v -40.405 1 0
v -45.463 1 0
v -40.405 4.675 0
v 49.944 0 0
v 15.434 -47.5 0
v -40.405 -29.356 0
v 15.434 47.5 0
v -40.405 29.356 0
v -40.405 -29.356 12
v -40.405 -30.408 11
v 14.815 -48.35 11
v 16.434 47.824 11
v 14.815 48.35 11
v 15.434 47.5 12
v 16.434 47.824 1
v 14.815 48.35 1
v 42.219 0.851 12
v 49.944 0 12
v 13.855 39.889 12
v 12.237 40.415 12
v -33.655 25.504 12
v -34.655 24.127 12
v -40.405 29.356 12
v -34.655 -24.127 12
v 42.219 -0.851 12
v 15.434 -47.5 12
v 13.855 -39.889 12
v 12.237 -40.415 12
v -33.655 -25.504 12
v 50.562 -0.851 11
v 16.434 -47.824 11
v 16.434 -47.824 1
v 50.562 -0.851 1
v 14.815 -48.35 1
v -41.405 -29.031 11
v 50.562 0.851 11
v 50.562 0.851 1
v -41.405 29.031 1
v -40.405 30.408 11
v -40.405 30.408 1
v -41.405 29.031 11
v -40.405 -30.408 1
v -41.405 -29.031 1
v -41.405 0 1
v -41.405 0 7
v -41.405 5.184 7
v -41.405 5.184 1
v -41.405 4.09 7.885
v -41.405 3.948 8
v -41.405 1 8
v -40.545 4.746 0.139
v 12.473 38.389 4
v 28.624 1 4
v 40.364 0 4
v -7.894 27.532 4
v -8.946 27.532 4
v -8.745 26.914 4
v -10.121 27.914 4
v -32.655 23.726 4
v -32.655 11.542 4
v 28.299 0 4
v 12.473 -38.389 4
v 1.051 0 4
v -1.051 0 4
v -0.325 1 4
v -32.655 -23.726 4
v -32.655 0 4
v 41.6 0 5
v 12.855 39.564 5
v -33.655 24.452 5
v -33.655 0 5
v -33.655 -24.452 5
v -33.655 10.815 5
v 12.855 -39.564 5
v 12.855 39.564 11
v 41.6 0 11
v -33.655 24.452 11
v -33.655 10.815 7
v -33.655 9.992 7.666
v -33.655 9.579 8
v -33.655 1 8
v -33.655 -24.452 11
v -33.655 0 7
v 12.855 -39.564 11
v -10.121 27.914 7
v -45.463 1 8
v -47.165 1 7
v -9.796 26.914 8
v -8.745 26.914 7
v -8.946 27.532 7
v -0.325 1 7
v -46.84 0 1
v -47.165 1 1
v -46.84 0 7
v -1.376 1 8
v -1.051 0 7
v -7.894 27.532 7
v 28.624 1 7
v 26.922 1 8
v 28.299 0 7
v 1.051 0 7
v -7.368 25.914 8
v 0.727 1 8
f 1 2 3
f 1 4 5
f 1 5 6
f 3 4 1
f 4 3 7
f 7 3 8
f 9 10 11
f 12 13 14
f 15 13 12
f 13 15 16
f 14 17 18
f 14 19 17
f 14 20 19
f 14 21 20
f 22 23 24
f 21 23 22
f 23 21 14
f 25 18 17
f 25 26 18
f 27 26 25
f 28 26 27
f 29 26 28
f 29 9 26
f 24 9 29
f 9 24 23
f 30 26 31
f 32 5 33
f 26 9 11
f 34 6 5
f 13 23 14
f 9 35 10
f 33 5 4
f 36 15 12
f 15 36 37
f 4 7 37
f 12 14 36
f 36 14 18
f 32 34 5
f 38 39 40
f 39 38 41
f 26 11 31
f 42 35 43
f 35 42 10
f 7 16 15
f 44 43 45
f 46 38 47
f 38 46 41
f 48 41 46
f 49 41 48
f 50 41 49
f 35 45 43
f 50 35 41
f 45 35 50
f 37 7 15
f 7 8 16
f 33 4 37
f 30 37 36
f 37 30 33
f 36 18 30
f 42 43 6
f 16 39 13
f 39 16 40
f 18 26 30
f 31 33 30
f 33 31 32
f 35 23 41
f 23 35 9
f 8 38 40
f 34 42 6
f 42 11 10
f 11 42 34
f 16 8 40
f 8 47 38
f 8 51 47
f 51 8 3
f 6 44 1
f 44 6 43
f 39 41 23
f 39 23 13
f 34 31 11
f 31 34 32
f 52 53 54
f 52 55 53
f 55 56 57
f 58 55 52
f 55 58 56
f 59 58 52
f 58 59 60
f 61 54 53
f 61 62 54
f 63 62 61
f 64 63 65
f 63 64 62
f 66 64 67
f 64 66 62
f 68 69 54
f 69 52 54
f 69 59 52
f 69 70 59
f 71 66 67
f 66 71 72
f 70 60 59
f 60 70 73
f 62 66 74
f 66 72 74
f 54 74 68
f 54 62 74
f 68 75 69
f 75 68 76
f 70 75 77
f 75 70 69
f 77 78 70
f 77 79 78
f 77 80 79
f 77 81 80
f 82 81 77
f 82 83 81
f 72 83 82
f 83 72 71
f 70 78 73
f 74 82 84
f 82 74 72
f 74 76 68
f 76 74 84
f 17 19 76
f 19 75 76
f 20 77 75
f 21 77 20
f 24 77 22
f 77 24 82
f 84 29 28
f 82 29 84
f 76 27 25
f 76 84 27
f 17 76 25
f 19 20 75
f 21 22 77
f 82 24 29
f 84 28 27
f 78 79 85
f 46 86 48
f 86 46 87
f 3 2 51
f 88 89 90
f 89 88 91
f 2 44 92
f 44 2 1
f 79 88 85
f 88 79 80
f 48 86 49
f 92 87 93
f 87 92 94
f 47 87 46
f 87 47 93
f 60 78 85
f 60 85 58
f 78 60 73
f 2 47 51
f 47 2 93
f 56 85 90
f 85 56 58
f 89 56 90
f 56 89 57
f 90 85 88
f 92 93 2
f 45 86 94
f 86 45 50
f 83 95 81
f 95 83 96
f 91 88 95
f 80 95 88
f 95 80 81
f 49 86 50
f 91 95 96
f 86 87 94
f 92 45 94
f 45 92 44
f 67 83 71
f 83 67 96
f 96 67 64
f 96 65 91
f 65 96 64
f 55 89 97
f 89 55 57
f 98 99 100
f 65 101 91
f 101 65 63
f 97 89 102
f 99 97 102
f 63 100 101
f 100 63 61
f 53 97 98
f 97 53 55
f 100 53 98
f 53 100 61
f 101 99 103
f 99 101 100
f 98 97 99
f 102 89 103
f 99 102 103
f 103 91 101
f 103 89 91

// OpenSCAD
// file: ../functions/vectors2D.scad
/* * * * * * * * * * * * * * * * * * * * * * * * * * * * * * * * * * * * *\
 * Copyright (C) Claus Schrammel <claus@f05fk.net>                       *
 *                                                                       *
 * This program is free software: you can redistribute it and/or modify  *
 * it under the terms of the GNU General Public License as published by  *
 * the Free Software Foundation, either version 3 of the License, or     *
 * (at your option) any later version.                                   *
 *                                                                       *
 * This program is distributed in the hope that it will be useful,       *
 * but WITHOUT ANY WARRANTY; without even the implied warranty of        *
 * MERCHANTABILITY or FITNESS FOR A PARTICULAR PURPOSE.  See the         *
 * GNU General Public License for more details.                          *
 *                                                                       *
 * You should have received a copy of the GNU General Public License     *
 * along with this program.  If not, see <http://www.gnu.org/licenses/>. *
 *                                                                       *
 * SPDX-License-Identifier: GPL-3.0-or-later                             *
\* * * * * * * * * * * * * * * * * * * * * * * * * * * * * * * * * * * * */

include <utils.scad>

function normal_vector_2D(vector) = [-vector.y, vector.x];
function unit_vector_2D(vector) = vector / norm(vector);

/*
 * Calculates the coefficient for v1 to get from p1 to the intersection point of the two lines p1/v1 and p2/v2:
 * intersection_point = p1 + v1 * intersection_coefficient1.
 */
function intersection_coefficient1(p1, v1, p2, v2) = ( v2.x * (p1.y - p2.y) - v2.y * (p1.x - p2.x) ) / (v1.x * v2.y - v1.y * v2.x);

/*
 * Calculates the coefficient for v2 to get from p2 to the intersection point of the two lines p1/v1 and p2/v2:
 * intersection_point = p2 + v2 * intersection_coefficient2.
 */
function intersection_coefficient2(p1, v1, p2, v2) = intersection_coefficient1(p2, v2, p1, v1);

/*
 * Calculates the intersection point of the two lines p1/v1 and p2/v2.
 */
function intersection_point(p1, v1, p2, v2) = p1 + v1 * intersection_coefficient1(p1, v1, p2, v2);
// file: ../functions/utils.scad
/* * * * * * * * * * * * * * * * * * * * * * * * * * * * * * * * * * * * *\
 * Copyright (C) Claus Schrammel <claus@f05fk.net>                       *
 *                                                                       *
 * This program is free software: you can redistribute it and/or modify  *
 * it under the terms of the GNU General Public License as published by  *
 * the Free Software Foundation, either version 3 of the License, or     *
 * (at your option) any later version.                                   *
 *                                                                       *
 * This program is distributed in the hope that it will be useful,       *
 * but WITHOUT ANY WARRANTY; without even the implied warranty of        *
 * MERCHANTABILITY or FITNESS FOR A PARTICULAR PURPOSE.  See the         *
 * GNU General Public License for more details.                          *
 *                                                                       *
 * You should have received a copy of the GNU General Public License     *
 * along with this program.  If not, see <http://www.gnu.org/licenses/>. *
 *                                                                       *
 * SPDX-License-Identifier: GPL-3.0-or-later                             *
\* * * * * * * * * * * * * * * * * * * * * * * * * * * * * * * * * * * * */

// the modulo operator % creates negative results for negative inputs n
function modulo(n, m) = ((n % m) + m) % m;

function cyclic_array(array, index) = array[modulo(index, len(array))];
// file: ../functions/polygons.scad
/* * * * * * * * * * * * * * * * * * * * * * * * * * * * * * * * * * * * *\
 * Copyright (C) Claus Schrammel <claus@f05fk.net>                       *
 *                                                                       *
 * This program is free software: you can redistribute it and/or modify  *
 * it under the terms of the GNU General Public License as published by  *
 * the Free Software Foundation, either version 3 of the License, or     *
 * (at your option) any later version.                                   *
 *                                                                       *
 * This program is distributed in the hope that it will be useful,       *
 * but WITHOUT ANY WARRANTY; without even the implied warranty of        *
 * MERCHANTABILITY or FITNESS FOR A PARTICULAR PURPOSE.  See the         *
 * GNU General Public License for more details.                          *
 *                                                                       *
 * You should have received a copy of the GNU General Public License     *
 * along with this program.  If not, see <http://www.gnu.org/licenses/>. *
 *                                                                       *
 * SPDX-License-Identifier: GPL-3.0-or-later                             *
\* * * * * * * * * * * * * * * * * * * * * * * * * * * * * * * * * * * * */

include <utils.scad>
include <vectors2D.scad>

/*
 * Shrinks the polygon by moving the edges "inwards" by the given distance.
 * The points need to be given in the counter-clockwise order, i.e. applying the
 * right-hand rule with the thumb pointing in the z direction.
 */
function shrink_edges(points, distance) =
    [ for (i = [0 : 1 : len(points) - 1])
        let (p1 = cyclic_array(points, i - 1), p2 = cyclic_array(points, i), p3 = cyclic_array(points, i + 1),
                v1 = p2 - p1, v2 = p3 - p2,
                n1 = unit_vector_2D(normal_vector_2D(v1)), n2 = unit_vector_2D(normal_vector_2D(v2)))
            intersection_point(p1 + n1 * distance, v1, p2 + n2 * distance, v2)
    ];

/*
 * Grows the polygon by moving the edges "outwards" by the given distance.
 * The points need to be given in the counter-clockwise order, i.e. applying the
 * right-hand rule with the thumb pointing in the z direction.
 */
function grow_edges(points, distance) = shrink_edges(points, -distance);

/*
 * Flattens the corners of the polygon by cutting off at the intersection points where one of the edges
 * is moved "inwards" by the given distance, while the other edge is not, and vice-versa.
 * The points need to be given in the counter-clockwise order, i.e. applying the
 * right-hand rule with the thumb pointing in the z direction.
 */
function flatten_corners(points, distance) = 
    [ for (i = [0 : 1 : len(points) - 1])
        let (p1 = cyclic_array(points, i - 1), p2 = cyclic_array(points, i), p3 = cyclic_array(points, i + 1),
                v1 = p2 - p1, v2 = p3 - p2,
                n1 = unit_vector_2D(normal_vector_2D(v1)), n2 = unit_vector_2D(normal_vector_2D(v2)))
            each [
                intersection_point(p1, v1, p2 + n2 * distance, v2),
                intersection_point(p1 + n1 * distance, v1, p2, v2)
            ]
    ];
// file: ../functions/constants.scad
/* * * * * * * * * * * * * * * * * * * * * * * * * * * * * * * * * * * * *\
 * Copyright (C) Claus Schrammel <claus@f05fk.net>                       *
 *                                                                       *
 * This program is free software: you can redistribute it and/or modify  *
 * it under the terms of the GNU General Public License as published by  *
 * the Free Software Foundation, either version 3 of the License, or     *
 * (at your option) any later version.                                   *
 *                                                                       *
 * This program is distributed in the hope that it will be useful,       *
 * but WITHOUT ANY WARRANTY; without even the implied warranty of        *
 * MERCHANTABILITY or FITNESS FOR A PARTICULAR PURPOSE.  See the         *
 * GNU General Public License for more details.                          *
 *                                                                       *
 * You should have received a copy of the GNU General Public License     *
 * along with this program.  If not, see <http://www.gnu.org/licenses/>. *
 *                                                                       *
 * SPDX-License-Identifier: GPL-3.0-or-later                             *
\* * * * * * * * * * * * * * * * * * * * * * * * * * * * * * * * * * * * */

PHI = (1 + sqrt(5)) / 2;
phi = 1 / PHI;
// main file
/* * * * * * * * * * * * * * * * * * * * * * * * * * * * * * * * * * * * *\
 * Copyright (C) Claus Schrammel <claus@f05fk.net>                       *
 *                                                                       *
 * This program is free software: you can redistribute it and/or modify  *
 * it under the terms of the GNU General Public License as published by  *
 * the Free Software Foundation, either version 3 of the License, or     *
 * (at your option) any later version.                                   *
 *                                                                       *
 * This program is distributed in the hope that it will be useful,       *
 * but WITHOUT ANY WARRANTY; without even the implied warranty of        *
 * MERCHANTABILITY or FITNESS FOR A PARTICULAR PURPOSE.  See the         *
 * GNU General Public License for more details.                          *
 *                                                                       *
 * You should have received a copy of the GNU General Public License     *
 * along with this program.  If not, see <http://www.gnu.org/licenses/>. *
 *                                                                       *
 * SPDX-License-Identifier: GPL-3.0-or-later                             *
\* * * * * * * * * * * * * * * * * * * * * * * * * * * * * * * * * * * * */
$fn = 120;

include <../functions/constants.scad>
use <../modules/PrismaChamfered.scad>

UNIT = 30;
R = sqrt((5 + sqrt(5)) / 10) * PHI * UNIT;

big = [[0,0], [cos(108), sin(108)], [-PHI, 0]] * UNIT;
PrismaChamfered(points = big, height = 8, chamfer = 1);

small = [[0,0], [1, 0], [cos(108), sin(108)]] * UNIT;
PrismaChamfered(points = small, height = 8, chamfer = 1);

pentagon = [[1, 0], [cos(72), sin(72)], [cos(144), sin(144)], [cos(-144), sin(-144)], [cos(-72), sin(-72)]] * R;
difference() {
    PrismaChamfered(points = grow_edges(pentagon, 8), height = 12, chamfer = 1, invert_bottom = false, invert_middle = false, invert_top = false);
    translate([0, 0, 4])
    PrismaChamfered(points = grow_edges(pentagon, 0.25), height = 8, chamfer = 1, invert_bottom = false, invert_middle = true, invert_top = true);
}
